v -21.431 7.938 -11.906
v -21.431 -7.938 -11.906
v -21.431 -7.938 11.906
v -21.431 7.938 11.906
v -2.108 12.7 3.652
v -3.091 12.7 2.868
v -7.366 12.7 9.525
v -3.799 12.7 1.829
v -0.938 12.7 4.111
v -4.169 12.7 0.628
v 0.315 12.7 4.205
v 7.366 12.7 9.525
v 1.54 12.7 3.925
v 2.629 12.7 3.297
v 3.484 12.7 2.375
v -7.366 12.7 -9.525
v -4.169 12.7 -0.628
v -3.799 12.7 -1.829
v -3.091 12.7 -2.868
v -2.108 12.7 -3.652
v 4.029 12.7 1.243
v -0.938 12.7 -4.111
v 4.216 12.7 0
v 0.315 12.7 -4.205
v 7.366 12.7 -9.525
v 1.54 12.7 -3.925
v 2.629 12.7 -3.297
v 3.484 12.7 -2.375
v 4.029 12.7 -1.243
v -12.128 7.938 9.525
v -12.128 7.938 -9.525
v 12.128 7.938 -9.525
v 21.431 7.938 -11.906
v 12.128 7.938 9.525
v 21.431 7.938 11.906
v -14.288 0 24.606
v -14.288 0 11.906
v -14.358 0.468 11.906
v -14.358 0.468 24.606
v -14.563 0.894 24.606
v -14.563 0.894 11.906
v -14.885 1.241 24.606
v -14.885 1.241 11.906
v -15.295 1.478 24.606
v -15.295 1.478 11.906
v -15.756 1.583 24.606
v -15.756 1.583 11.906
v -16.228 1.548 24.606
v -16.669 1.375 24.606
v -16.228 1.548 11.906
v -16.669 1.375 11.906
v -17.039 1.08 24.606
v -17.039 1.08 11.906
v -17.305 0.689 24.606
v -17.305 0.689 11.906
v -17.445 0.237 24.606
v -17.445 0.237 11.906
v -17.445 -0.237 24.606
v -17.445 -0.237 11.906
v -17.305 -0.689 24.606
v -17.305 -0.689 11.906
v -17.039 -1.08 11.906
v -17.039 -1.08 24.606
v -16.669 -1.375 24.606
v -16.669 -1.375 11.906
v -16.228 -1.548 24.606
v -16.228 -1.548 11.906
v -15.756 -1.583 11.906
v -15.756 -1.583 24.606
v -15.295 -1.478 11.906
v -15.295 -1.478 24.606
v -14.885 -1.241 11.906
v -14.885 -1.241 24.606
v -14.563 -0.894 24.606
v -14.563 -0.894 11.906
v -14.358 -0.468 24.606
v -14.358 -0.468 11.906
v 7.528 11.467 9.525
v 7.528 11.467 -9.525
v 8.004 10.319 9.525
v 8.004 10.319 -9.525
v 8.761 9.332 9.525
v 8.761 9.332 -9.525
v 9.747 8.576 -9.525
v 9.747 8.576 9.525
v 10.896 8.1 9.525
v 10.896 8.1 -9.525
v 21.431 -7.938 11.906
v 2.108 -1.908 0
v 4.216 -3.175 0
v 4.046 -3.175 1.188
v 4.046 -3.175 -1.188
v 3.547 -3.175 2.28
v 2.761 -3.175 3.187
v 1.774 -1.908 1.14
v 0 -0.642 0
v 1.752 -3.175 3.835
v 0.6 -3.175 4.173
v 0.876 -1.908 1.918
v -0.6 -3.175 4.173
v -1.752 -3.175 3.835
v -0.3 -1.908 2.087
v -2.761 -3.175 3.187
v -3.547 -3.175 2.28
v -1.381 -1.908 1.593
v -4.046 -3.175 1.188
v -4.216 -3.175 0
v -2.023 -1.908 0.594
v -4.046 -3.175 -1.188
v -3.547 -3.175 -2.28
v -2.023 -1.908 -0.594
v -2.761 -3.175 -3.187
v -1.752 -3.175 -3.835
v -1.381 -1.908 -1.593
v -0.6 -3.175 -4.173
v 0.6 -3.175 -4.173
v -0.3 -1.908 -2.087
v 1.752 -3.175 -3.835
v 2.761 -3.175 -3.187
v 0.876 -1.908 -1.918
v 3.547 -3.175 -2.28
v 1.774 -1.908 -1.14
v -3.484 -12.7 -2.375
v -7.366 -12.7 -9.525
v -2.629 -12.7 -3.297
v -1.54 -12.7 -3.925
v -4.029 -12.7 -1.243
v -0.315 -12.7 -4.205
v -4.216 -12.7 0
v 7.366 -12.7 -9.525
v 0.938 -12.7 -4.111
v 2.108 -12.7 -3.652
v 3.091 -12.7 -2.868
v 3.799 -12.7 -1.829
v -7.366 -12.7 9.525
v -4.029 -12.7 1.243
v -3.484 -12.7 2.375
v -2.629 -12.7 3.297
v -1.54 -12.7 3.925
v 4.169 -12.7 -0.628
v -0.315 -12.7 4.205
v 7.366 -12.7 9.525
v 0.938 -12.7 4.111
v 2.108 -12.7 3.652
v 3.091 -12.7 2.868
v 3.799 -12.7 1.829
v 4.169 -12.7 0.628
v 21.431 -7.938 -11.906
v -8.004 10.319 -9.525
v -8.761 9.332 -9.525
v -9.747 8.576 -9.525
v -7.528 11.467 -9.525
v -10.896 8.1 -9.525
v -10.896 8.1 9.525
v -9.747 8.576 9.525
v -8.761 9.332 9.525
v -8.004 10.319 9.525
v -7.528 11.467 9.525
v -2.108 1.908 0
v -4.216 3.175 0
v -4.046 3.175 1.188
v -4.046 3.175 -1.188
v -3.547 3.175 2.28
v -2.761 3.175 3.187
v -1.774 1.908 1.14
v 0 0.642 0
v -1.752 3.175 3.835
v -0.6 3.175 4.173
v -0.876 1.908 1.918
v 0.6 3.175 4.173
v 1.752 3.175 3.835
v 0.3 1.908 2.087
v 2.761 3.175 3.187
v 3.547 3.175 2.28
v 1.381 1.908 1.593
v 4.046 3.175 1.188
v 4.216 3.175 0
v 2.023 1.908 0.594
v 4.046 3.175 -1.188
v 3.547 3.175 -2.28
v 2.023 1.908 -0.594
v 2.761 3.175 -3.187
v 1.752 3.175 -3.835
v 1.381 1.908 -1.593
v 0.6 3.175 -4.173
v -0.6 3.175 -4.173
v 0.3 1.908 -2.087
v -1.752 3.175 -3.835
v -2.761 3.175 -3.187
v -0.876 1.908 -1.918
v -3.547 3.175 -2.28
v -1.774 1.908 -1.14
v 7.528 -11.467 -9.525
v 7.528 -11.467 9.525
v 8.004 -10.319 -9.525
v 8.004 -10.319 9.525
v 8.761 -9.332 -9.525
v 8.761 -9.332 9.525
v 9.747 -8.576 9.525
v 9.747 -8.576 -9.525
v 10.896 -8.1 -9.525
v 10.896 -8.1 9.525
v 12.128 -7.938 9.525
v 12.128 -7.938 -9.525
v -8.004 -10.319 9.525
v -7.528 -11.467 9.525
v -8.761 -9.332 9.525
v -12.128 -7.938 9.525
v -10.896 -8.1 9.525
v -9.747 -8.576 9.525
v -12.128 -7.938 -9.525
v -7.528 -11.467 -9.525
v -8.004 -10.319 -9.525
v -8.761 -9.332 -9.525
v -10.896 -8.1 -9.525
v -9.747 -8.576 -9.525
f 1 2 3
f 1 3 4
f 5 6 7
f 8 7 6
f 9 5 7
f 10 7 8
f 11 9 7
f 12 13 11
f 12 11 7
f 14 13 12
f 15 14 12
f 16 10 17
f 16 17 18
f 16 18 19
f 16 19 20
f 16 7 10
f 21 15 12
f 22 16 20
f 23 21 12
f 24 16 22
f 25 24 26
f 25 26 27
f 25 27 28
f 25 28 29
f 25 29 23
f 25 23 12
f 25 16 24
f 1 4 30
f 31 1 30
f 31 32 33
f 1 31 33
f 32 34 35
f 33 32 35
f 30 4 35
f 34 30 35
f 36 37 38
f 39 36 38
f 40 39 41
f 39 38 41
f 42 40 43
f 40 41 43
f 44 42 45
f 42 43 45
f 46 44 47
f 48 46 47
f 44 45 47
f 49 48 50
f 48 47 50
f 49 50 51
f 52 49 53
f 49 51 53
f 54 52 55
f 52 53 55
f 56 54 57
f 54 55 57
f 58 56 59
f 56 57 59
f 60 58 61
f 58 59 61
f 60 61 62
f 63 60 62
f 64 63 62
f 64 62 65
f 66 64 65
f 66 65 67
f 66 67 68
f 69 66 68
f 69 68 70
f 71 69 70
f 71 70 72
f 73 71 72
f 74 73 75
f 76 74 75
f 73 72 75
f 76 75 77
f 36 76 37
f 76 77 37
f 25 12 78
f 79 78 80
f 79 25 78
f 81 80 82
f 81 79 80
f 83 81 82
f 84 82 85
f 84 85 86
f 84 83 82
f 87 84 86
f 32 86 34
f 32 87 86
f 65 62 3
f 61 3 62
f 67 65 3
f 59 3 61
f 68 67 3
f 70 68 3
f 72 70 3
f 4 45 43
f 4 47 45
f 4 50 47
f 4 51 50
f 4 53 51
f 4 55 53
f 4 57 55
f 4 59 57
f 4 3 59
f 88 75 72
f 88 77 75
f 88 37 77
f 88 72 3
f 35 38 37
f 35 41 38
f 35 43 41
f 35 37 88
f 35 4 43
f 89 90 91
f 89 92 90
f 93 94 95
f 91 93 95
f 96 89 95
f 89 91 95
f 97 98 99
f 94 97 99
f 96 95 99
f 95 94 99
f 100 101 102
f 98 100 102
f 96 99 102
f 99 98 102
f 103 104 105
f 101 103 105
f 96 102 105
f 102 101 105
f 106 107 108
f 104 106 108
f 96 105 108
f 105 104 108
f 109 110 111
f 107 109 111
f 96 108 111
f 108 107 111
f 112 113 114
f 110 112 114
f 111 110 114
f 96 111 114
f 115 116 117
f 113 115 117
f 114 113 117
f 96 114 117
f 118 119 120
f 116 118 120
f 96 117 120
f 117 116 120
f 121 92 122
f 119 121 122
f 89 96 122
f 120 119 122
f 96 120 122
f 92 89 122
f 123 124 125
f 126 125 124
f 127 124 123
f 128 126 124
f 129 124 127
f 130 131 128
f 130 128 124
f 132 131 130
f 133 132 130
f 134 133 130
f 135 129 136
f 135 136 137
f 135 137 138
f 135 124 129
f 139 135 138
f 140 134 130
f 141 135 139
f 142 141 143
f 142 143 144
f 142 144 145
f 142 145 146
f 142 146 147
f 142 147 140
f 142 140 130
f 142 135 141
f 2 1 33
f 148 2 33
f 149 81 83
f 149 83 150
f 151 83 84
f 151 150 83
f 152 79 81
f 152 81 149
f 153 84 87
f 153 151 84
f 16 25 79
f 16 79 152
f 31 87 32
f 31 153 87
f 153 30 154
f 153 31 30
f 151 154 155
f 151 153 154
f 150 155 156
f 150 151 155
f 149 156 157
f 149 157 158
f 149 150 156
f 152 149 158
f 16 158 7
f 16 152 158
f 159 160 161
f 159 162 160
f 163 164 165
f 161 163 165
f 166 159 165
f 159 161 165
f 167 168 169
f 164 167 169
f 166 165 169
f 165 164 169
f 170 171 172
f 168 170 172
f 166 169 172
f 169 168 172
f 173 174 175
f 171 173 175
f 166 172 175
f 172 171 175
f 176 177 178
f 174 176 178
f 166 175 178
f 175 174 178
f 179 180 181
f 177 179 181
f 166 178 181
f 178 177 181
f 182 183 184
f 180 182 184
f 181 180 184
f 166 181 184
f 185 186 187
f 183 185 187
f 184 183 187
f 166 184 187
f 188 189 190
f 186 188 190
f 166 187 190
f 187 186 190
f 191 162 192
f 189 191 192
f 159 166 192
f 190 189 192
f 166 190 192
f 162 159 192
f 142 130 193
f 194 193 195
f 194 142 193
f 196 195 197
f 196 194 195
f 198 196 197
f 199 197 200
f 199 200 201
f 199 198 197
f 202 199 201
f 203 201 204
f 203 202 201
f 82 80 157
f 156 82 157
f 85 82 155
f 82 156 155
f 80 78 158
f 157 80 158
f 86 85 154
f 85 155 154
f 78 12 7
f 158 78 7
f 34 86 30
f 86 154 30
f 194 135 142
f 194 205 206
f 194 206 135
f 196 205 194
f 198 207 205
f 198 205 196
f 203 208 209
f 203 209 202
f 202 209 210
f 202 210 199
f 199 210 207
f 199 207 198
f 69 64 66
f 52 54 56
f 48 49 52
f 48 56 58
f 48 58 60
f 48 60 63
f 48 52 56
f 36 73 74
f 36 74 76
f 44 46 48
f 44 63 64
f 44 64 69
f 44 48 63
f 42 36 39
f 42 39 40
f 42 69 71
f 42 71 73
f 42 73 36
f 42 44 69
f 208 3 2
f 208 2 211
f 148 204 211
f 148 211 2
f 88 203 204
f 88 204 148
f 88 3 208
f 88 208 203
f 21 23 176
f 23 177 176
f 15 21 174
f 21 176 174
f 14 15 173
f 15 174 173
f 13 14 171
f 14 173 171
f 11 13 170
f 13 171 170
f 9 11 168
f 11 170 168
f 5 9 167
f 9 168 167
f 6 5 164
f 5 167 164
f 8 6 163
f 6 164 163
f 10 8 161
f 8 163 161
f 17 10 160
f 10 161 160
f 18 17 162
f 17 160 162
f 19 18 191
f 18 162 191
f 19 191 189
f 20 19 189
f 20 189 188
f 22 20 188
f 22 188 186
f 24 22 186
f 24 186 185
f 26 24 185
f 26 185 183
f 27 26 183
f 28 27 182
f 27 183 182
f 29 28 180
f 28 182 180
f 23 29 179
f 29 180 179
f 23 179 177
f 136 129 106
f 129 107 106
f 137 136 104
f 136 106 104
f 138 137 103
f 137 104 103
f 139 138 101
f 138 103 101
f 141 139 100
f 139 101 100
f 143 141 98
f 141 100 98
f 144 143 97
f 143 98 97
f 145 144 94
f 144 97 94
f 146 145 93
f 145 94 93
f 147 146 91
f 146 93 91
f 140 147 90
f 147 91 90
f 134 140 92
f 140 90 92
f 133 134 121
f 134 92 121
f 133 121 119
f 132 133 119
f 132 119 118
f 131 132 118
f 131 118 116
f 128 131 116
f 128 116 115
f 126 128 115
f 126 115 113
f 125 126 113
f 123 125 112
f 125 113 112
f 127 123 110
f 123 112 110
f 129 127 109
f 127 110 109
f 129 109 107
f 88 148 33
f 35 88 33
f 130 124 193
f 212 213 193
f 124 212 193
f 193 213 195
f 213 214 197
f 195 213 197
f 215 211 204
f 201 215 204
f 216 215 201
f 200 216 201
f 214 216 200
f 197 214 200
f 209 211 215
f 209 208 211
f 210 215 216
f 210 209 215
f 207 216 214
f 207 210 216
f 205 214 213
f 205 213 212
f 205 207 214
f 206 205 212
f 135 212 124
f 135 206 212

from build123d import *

# Parameters (mm, degrees)
SKETCH1_W                   = 42.8625
SKETCH1_H                   = 15.875
EXTRUDE1_DEPTH              = 11.90625
EXTRUDE2_DEPTH              = 9.525
F_3_8_24_TAPPED_HOLE1_D     = 8.4328
F_3_8_24_TAPPED_HOLE1_DEPTH = 9.525
F_3_8_24_TAPPED_HOLE1_TIP   = 2.533468714
F_3_8_24_TAPPED_HOLE2_D     = 8.4328
F_3_8_24_TAPPED_HOLE2_DEPTH = 9.525
F_3_8_24_TAPPED_HOLE2_TIP   = 2.533468714
SKETCH7_R                   = 1.5875
EXTRUDE3_DEPTH              = 12.7


with BuildPart() as part:
    # Sketch1 → Extrude1 (new, symmetric)
    with BuildSketch(Plane.XY):
        Rectangle(SKETCH1_W, SKETCH1_H)
    extrude(amount=EXTRUDE1_DEPTH, both=True)

    # Sketch2 → Extrude2 (add, symmetric)
    with BuildSketch(Plane.XY):
        with BuildLine():
            Line((-7.366, 12.7), (7.366, 12.7))
            ThreePointArc((7.366, 12.7), (8.760903955, 9.332403955), (12.1285, 7.9375))
            Line((12.1285, 7.9375), (-12.1285, 7.9375))
            ThreePointArc((-12.1285, 7.9375), (-8.760903955, 9.332403955), (-7.366, 12.7))
        make_face()
        with BuildLine():
            Line((-7.366, -12.7), (7.366, -12.7))
            ThreePointArc((7.366, -12.7), (8.760903955, -9.332403955), (12.1285, -7.9375))
            Line((12.1285, -7.9375), (-12.1285, -7.9375))
            ThreePointArc((-12.1285, -7.9375), (-8.760903955, -9.332403955), (-7.366, -12.7))
        make_face()
    extrude(amount=EXTRUDE2_DEPTH, both=True)

    # 3/8-24 Tapped Hole1
    with Locations(Plane(origin=(0, 12.7, 0), x_dir=(-1, 0, 0), z_dir=(0, 1, 0))):
        with Locations((0, 0)):
            Hole(F_3_8_24_TAPPED_HOLE1_D / 2, depth=F_3_8_24_TAPPED_HOLE1_DEPTH)
            with Locations((0, 0, -(F_3_8_24_TAPPED_HOLE1_DEPTH + F_3_8_24_TAPPED_HOLE1_TIP / 2))):  # 118° drill point
                Cone(0, F_3_8_24_TAPPED_HOLE1_D / 2, F_3_8_24_TAPPED_HOLE1_TIP, mode=Mode.SUBTRACT)

    # 3/8-24 Tapped Hole2
    with Locations(Plane.XZ.offset(12.7)):
        with Locations((0, 0)):
            Hole(F_3_8_24_TAPPED_HOLE2_D / 2, depth=F_3_8_24_TAPPED_HOLE2_DEPTH)
            with Locations((0, 0, -(F_3_8_24_TAPPED_HOLE2_DEPTH + F_3_8_24_TAPPED_HOLE2_TIP / 2))):  # 118° drill point
                Cone(0, F_3_8_24_TAPPED_HOLE2_D / 2, F_3_8_24_TAPPED_HOLE2_TIP, mode=Mode.SUBTRACT)

    # Sketch7 → Extrude3 (add)
    with BuildSketch(Plane.XY.offset(11.90625)):
        with Locations((-15.875, 0)):
            Circle(SKETCH7_R)
    extrude(amount=EXTRUDE3_DEPTH)


solid = part.part
